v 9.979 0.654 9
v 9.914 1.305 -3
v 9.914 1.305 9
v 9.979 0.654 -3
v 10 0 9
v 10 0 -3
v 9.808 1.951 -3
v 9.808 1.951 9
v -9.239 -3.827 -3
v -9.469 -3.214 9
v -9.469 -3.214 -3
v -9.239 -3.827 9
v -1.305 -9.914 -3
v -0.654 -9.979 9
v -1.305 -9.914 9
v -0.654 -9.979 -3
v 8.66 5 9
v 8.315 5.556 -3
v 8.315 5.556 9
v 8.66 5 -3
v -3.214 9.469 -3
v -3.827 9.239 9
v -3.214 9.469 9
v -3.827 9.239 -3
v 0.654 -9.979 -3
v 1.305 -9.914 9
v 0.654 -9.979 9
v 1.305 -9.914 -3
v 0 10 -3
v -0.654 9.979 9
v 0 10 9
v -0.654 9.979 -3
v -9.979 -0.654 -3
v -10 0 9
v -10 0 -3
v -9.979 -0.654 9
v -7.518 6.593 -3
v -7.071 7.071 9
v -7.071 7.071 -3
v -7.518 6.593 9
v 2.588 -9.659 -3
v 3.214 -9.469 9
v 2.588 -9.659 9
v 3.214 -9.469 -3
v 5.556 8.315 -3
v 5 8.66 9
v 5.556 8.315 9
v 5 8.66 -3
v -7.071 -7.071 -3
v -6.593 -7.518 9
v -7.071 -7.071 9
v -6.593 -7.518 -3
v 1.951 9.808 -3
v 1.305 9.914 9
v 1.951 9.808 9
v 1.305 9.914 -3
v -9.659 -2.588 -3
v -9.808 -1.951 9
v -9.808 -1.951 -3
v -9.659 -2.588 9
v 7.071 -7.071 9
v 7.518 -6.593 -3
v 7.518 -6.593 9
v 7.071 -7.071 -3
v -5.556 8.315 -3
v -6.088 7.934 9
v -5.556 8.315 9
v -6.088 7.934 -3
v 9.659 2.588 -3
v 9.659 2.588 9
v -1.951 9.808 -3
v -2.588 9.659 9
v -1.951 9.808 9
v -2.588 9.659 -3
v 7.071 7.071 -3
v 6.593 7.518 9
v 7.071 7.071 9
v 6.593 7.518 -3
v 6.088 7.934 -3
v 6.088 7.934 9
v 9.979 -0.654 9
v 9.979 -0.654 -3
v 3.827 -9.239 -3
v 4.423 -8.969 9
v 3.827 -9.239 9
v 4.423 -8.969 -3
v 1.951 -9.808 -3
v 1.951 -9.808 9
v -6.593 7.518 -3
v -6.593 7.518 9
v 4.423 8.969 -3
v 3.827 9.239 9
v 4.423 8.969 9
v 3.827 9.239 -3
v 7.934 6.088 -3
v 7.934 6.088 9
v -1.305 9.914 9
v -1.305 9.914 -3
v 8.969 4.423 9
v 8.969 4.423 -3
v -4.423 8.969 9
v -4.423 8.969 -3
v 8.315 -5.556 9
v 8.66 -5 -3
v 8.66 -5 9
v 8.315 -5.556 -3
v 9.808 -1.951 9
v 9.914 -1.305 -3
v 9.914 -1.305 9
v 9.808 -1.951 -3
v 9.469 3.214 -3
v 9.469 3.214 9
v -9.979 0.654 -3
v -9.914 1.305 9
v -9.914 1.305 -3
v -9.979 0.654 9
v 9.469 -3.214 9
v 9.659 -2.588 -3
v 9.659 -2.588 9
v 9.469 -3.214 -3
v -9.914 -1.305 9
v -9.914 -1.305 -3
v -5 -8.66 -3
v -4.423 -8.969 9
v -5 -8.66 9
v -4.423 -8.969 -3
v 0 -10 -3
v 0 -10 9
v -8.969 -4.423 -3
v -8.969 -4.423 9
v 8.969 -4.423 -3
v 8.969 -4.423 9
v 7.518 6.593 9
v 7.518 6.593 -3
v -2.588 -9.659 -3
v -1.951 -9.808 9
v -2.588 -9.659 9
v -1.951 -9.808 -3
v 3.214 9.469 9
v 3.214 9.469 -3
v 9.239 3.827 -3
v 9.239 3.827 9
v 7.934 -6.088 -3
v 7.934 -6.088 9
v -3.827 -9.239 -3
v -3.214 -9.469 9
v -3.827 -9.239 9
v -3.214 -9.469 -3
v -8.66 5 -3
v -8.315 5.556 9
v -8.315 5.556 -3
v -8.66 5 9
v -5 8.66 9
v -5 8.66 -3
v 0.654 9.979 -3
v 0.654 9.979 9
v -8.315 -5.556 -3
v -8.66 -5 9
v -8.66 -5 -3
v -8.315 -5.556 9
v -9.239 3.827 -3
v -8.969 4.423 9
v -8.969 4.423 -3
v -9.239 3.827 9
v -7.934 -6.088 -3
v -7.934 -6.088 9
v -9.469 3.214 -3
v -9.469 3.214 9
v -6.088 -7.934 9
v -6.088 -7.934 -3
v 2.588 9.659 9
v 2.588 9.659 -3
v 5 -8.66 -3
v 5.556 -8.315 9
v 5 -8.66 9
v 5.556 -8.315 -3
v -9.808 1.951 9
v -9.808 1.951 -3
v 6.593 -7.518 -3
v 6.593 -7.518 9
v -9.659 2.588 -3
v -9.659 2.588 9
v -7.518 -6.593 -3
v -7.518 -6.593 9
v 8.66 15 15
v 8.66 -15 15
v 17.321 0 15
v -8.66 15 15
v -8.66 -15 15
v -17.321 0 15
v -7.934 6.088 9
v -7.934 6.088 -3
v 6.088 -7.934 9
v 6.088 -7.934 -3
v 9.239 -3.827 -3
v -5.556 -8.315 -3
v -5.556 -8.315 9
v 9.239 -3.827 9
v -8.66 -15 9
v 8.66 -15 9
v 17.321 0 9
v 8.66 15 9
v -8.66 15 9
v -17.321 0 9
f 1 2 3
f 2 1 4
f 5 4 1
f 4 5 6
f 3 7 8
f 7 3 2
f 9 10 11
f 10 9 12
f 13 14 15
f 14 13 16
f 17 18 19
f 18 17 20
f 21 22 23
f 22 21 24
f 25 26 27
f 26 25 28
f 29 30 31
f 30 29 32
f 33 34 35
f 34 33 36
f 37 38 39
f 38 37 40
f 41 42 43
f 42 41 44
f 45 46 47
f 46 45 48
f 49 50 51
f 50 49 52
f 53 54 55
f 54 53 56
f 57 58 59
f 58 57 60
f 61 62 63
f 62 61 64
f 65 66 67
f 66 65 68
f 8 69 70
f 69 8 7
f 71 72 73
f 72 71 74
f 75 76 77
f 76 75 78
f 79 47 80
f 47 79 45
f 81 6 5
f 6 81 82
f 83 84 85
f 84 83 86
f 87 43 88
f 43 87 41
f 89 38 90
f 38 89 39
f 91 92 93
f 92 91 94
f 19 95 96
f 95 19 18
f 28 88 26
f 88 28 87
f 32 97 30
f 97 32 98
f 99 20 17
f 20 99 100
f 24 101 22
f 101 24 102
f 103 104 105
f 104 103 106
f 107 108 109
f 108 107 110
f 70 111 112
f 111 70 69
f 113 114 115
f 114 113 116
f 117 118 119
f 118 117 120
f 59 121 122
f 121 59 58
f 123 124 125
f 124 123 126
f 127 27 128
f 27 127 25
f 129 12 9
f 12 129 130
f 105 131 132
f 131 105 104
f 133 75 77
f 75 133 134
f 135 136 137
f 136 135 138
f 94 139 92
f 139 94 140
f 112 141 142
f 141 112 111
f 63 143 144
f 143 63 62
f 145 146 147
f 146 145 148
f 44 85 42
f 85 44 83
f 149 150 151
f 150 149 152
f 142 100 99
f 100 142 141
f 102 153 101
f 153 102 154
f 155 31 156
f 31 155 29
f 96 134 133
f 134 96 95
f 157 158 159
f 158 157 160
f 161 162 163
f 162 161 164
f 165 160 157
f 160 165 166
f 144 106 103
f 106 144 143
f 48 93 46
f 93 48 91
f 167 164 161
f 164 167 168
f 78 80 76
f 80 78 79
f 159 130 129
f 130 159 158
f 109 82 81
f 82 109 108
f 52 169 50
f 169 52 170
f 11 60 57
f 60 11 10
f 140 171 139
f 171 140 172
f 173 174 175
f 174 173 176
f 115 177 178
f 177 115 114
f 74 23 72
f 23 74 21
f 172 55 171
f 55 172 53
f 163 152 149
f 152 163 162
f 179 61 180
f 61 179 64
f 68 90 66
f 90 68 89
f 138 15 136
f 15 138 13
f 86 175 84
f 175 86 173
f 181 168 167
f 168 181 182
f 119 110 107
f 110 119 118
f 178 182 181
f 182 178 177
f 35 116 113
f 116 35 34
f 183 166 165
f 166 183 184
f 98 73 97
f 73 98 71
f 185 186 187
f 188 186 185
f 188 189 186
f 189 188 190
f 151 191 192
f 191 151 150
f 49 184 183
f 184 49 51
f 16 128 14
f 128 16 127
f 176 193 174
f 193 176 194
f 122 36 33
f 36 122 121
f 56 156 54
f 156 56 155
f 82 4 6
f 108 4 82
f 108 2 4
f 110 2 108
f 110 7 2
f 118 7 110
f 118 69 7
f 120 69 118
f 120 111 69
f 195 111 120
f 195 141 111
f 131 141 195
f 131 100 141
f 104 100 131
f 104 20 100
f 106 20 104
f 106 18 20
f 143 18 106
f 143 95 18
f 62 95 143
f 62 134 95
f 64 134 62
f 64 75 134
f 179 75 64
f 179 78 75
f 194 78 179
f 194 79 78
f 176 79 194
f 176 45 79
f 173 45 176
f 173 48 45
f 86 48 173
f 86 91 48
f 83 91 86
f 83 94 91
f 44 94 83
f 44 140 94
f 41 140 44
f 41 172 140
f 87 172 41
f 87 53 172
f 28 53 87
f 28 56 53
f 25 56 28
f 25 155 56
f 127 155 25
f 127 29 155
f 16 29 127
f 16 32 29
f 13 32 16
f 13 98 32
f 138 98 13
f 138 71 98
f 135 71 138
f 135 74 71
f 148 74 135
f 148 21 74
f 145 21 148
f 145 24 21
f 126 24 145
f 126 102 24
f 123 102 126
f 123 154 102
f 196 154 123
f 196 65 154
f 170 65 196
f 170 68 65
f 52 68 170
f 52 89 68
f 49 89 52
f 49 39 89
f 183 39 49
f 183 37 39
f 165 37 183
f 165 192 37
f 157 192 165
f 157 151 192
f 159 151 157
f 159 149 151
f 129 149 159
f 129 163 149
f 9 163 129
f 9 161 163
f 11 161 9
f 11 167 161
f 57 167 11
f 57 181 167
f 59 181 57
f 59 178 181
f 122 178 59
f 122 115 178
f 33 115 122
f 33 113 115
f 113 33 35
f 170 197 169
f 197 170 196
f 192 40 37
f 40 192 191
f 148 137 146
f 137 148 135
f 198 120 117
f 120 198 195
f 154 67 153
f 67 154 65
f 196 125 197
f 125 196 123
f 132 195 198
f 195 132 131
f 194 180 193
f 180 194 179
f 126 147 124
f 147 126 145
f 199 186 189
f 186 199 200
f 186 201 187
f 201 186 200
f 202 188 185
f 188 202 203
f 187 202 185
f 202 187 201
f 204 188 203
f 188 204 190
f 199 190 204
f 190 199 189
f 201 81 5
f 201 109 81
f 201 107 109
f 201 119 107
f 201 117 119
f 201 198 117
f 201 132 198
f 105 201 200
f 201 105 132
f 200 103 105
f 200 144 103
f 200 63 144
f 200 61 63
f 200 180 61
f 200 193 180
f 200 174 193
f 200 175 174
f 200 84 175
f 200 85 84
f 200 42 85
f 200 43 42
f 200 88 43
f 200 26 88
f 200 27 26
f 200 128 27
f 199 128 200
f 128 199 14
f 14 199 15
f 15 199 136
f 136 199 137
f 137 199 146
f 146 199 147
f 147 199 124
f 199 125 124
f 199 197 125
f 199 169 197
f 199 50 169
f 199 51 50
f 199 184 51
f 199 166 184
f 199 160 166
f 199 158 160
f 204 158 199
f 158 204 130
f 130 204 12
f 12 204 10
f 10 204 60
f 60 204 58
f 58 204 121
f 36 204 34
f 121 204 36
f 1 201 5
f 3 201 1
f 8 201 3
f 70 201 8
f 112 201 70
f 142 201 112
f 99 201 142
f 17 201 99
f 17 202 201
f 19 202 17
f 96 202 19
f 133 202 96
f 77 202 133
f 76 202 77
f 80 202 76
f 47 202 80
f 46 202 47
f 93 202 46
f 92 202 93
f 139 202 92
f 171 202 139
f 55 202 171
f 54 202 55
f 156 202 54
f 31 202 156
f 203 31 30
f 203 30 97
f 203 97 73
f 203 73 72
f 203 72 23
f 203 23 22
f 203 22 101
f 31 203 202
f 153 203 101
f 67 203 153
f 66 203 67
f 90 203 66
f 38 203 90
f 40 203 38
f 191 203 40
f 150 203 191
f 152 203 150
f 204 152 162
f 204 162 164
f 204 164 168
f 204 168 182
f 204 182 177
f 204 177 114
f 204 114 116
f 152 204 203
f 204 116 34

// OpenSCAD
$fn=96;

body_d = 20;
body_h = 18;

flange_af = 30;          // across flats
flange_h = 6;

module hex_prism(af, h){
    r = af / sqrt(3);    // circumradius for regular hex with given across-flats
    cylinder(h=h, r=r, $fn=6);
}

module flanged_sleeve(){
    union(){
        translate([0,0,body_h/2])
            cylinder(h=body_h, d=body_d);
        translate([0,0,body_h + flange_h/2])
            hex_prism(flange_af, flange_h);
    }
}

translate([0,0,-(body_h + flange_h)/2])
    flanged_sleeve();
